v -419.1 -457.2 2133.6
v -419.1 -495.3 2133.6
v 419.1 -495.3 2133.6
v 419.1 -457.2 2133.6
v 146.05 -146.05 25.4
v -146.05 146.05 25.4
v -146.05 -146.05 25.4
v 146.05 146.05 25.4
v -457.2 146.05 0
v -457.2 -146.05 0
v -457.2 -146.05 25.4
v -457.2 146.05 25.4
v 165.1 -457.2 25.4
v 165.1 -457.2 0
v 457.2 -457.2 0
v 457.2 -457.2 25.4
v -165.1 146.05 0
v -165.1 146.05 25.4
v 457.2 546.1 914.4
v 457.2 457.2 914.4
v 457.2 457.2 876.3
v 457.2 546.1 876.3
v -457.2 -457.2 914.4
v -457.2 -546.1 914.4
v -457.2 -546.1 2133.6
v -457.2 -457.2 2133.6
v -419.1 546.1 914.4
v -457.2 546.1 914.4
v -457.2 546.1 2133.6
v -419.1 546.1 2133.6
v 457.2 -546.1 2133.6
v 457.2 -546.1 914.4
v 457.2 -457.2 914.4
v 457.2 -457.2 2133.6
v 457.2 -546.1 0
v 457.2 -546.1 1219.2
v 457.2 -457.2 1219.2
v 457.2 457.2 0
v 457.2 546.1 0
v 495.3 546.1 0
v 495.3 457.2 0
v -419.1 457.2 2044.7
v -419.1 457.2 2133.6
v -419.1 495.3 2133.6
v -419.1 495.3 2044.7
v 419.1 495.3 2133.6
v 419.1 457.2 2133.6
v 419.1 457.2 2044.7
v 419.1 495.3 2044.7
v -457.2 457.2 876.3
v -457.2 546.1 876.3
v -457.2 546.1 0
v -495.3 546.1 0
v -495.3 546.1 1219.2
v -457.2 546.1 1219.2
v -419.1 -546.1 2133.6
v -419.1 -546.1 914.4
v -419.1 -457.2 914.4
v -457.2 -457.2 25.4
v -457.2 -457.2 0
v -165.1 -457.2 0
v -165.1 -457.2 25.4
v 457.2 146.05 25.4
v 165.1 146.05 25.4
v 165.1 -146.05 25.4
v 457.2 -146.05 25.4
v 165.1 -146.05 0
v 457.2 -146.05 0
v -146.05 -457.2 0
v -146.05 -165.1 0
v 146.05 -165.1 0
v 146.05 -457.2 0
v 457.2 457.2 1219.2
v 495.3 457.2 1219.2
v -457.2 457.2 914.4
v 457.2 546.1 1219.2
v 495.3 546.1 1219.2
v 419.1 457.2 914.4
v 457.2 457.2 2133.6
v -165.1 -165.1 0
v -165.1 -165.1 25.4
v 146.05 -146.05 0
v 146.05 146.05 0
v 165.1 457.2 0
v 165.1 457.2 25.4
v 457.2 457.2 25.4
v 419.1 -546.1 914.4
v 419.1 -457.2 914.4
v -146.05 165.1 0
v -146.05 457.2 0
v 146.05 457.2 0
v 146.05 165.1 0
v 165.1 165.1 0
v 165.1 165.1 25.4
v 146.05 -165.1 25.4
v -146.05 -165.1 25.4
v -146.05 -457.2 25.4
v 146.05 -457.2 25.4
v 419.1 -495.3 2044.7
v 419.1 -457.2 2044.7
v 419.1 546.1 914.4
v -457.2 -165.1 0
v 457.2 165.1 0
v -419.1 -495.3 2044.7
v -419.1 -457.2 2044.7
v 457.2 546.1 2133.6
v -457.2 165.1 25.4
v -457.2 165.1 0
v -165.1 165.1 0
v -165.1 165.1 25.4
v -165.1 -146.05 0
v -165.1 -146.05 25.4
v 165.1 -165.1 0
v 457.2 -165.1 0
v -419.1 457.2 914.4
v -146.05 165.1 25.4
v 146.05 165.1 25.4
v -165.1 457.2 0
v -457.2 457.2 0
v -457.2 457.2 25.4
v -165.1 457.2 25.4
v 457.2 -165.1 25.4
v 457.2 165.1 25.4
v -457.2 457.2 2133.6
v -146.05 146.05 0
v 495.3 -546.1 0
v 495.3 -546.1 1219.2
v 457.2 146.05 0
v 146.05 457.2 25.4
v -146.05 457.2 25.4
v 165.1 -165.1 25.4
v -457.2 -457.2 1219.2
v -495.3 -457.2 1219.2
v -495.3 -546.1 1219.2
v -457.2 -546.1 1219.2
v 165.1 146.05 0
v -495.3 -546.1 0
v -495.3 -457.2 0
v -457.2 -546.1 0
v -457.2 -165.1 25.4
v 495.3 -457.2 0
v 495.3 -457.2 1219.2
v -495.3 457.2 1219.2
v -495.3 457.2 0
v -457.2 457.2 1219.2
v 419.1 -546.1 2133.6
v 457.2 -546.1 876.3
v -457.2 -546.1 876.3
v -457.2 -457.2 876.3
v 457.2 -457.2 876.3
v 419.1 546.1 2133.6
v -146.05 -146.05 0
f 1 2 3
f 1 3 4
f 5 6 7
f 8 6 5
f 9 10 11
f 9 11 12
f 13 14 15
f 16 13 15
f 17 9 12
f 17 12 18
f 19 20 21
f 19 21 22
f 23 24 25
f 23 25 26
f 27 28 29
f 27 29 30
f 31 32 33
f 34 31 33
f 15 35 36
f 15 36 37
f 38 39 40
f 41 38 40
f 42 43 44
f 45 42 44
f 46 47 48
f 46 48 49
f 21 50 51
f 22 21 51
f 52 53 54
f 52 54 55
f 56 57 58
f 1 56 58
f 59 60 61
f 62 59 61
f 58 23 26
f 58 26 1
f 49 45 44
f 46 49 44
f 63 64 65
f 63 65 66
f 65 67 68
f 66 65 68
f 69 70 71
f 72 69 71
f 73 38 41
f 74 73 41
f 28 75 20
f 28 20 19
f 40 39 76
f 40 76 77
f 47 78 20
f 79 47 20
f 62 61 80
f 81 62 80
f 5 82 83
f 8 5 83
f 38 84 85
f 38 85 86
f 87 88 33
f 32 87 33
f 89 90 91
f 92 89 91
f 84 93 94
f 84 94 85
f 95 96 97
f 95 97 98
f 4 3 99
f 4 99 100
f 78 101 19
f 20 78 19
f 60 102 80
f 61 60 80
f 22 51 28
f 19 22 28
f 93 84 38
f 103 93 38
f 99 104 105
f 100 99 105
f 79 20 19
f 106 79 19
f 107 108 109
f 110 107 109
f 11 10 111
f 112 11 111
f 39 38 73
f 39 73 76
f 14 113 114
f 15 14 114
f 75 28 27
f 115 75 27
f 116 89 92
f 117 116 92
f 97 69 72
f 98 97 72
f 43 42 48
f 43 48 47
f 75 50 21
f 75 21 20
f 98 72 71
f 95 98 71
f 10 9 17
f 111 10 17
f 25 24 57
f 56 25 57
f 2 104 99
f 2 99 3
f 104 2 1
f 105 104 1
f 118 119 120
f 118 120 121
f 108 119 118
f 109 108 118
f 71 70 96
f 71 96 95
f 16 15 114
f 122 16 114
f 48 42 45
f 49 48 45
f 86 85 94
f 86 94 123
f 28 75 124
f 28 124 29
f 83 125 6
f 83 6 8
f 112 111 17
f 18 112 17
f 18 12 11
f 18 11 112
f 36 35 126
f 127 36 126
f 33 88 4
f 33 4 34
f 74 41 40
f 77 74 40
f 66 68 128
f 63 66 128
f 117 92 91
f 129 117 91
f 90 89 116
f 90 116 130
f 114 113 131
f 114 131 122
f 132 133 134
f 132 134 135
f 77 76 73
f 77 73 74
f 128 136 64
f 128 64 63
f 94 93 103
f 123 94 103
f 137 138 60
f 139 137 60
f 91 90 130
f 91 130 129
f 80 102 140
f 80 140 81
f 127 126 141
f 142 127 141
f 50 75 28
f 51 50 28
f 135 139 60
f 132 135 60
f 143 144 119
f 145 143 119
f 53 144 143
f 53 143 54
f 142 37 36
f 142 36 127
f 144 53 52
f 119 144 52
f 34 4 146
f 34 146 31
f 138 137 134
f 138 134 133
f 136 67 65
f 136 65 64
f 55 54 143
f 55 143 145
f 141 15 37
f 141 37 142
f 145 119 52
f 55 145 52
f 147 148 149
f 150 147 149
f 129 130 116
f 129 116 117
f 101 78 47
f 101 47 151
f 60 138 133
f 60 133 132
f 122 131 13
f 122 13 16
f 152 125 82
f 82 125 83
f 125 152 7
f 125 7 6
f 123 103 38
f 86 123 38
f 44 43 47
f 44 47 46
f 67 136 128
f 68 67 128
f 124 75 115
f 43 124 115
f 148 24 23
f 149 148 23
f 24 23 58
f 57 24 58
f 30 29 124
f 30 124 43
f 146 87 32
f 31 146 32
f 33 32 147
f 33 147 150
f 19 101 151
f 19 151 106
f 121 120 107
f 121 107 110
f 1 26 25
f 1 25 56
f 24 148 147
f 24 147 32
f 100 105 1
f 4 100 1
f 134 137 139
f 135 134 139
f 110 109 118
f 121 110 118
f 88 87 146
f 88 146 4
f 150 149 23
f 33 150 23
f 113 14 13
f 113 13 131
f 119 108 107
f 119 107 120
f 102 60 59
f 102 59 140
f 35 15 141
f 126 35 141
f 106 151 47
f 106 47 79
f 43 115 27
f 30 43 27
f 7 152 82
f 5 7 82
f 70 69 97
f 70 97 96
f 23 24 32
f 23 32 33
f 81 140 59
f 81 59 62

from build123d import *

# Parameters (mm, degrees)
F0_W      = 292.1
F0_H      = 292.1
F1_DEPTH  = 25.4
F2_W      = 38.1
F2_H      = 88.9
F3_DEPTH  = 1219.2
F5_W      = 38.1
F5_H      = 88.9
F6_DEPTH  = 1219.2
F7_W      = 88.9
F7_H      = 38.1
F8_DEPTH  = 914.4
F9_W      = 38.1
F9_H      = 88.9
F10_DEPTH = 838.2


with BuildPart() as f1:
    # F0 (on Top) → F1 (new body)
    with BuildSketch(Plane.XY):
        with Locations((-311.15, 311.15)):
            Rectangle(F0_W, F0_H)
    extrude(amount=F1_DEPTH)


with BuildPart() as f1b:
    # F0 (on Top) → F1, piece 2 (new body)
    with BuildSketch(Plane.XY):
        with Locations((-311.15, 0)):
            Rectangle(F0_W, F0_H)
    extrude(amount=F1_DEPTH)


with BuildPart() as f1c:
    # F0 (on Top) → F1, piece 3 (new body)
    with BuildSketch(Plane.XY):
        with Locations((-311.15, -311.15)):
            Rectangle(F0_W, F0_H)
    extrude(amount=F1_DEPTH)


with BuildPart() as f1d:
    # F0 (on Top) → F1, piece 4 (new body)
    with BuildSketch(Plane.XY):
        with Locations((0, 311.15)):
            Rectangle(F0_W, F0_H)
    extrude(amount=F1_DEPTH)


with BuildPart() as f1e:
    # F0 (on Top) → F1, piece 5 (new body)
    with BuildSketch(Plane.XY):
        Rectangle(F0_W, F0_H)
    extrude(amount=F1_DEPTH)


with BuildPart() as f1f:
    # F0 (on Top) → F1, piece 6 (new body)
    with BuildSketch(Plane.XY):
        with Locations((0, -311.15)):
            Rectangle(F0_W, F0_H)
    extrude(amount=F1_DEPTH)


with BuildPart() as f1g:
    # F0 (on Top) → F1, piece 7 (new body)
    with BuildSketch(Plane.XY):
        with Locations((311.15, 311.15)):
            Rectangle(F0_W, F0_H)
    extrude(amount=F1_DEPTH)


with BuildPart() as f1h:
    # F0 (on Top) → F1, piece 8 (new body)
    with BuildSketch(Plane.XY):
        with Locations((311.15, 0)):
            Rectangle(F0_W, F0_H)
    extrude(amount=F1_DEPTH)


with BuildPart() as f1i:
    # F0 (on Top) → F1, piece 9 (new body)
    with BuildSketch(Plane.XY):
        with Locations((311.15, -311.15)):
            Rectangle(F0_W, F0_H)
    extrude(amount=F1_DEPTH)


with BuildPart() as f3:
    # F2 (on Top) → F3 (new body)
    with BuildSketch(Plane.XY):
        with Locations((-476.25, 501.65)):
            Rectangle(F2_W, F2_H)
    extrude(amount=F3_DEPTH)


with BuildPart() as f3b:
    # F2 (on Top) → F3, piece 2 (new body)
    with BuildSketch(Plane.XY):
        with Locations((-476.25, -501.65)):
            Rectangle(F2_W, F2_H)
    extrude(amount=F3_DEPTH)


with BuildPart() as f3c:
    # F2 (on Top) → F3, piece 3 (new body)
    with BuildSketch(Plane.XY):
        with Locations((476.25, 501.65)):
            Rectangle(F2_W, F2_H)
    extrude(amount=F3_DEPTH)


with BuildPart() as f3d:
    # F2 (on Top) → F3, piece 4 (new body)
    with BuildSketch(Plane.XY):
        with Locations((476.25, -501.65)):
            Rectangle(F2_W, F2_H)
    extrude(amount=F3_DEPTH)


with BuildPart() as f6:
    # F5 (on offset) → F6 (new body)
    with BuildSketch(Plane.XY.offset(914.4)):
        with Locations((-438.15, 501.65)):
            Rectangle(F5_W, F5_H)
    extrude(amount=F6_DEPTH)


with BuildPart() as f6b:
    # F5 (on offset) → F6, piece 2 (new body)
    with BuildSketch(Plane.XY.offset(914.4)):
        with Locations((-438.15, -501.65)):
            Rectangle(F5_W, F5_H)
    extrude(amount=F6_DEPTH)


with BuildPart() as f6c:
    # F5 (on offset) → F6, piece 3 (new body)
    with BuildSketch(Plane.XY.offset(914.4)):
        with Locations((438.15, 501.65)):
            Rectangle(F5_W, F5_H)
    extrude(amount=F6_DEPTH)


with BuildPart() as f6d:
    # F5 (on offset) → F6, piece 4 (new body)
    with BuildSketch(Plane.XY.offset(914.4)):
        with Locations((438.15, -501.65)):
            Rectangle(F5_W, F5_H)
    extrude(amount=F6_DEPTH)


with BuildPart() as f8:
    # F7 (on face) → F8 (new body, through all)
    with BuildSketch(Plane.YZ.offset(-457.2)):
        with Locations((-501.65, 895.35)):
            Rectangle(F7_W, F7_H)
    extrude(amount=F8_DEPTH)


with BuildPart() as f8b:
    # F7 (on face) → F8, piece 2 (new body, through all)
    with BuildSketch(Plane.YZ.offset(-457.2)):
        with Locations((501.65, 895.35)):
            Rectangle(F7_W, F7_H)
    extrude(amount=F8_DEPTH)


with BuildPart() as f10:
    # F9 (on face) → F10 (new body, through all)
    with BuildSketch(Plane.YZ.offset(-419.1)):
        with Locations((-476.25, 2089.15)):
            Rectangle(F9_W, F9_H)
    extrude(amount=F10_DEPTH)


with BuildPart() as f10b:
    # F9 (on face) → F10, piece 2 (new body, through all)
    with BuildSketch(Plane.YZ.offset(-419.1)):
        with Locations((476.25, 2089.15)):
            Rectangle(F9_W, F9_H)
    extrude(amount=F10_DEPTH)


solid = Compound([f1.part, f1b.part, f1c.part, f1d.part, f1e.part, f1f.part, f1g.part, f1h.part, f1i.part, f3.part, f3b.part, f3c.part, f3d.part, f6.part, f6b.part, f6c.part, f6d.part, f8.part, f8b.part, f10.part, f10b.part])
